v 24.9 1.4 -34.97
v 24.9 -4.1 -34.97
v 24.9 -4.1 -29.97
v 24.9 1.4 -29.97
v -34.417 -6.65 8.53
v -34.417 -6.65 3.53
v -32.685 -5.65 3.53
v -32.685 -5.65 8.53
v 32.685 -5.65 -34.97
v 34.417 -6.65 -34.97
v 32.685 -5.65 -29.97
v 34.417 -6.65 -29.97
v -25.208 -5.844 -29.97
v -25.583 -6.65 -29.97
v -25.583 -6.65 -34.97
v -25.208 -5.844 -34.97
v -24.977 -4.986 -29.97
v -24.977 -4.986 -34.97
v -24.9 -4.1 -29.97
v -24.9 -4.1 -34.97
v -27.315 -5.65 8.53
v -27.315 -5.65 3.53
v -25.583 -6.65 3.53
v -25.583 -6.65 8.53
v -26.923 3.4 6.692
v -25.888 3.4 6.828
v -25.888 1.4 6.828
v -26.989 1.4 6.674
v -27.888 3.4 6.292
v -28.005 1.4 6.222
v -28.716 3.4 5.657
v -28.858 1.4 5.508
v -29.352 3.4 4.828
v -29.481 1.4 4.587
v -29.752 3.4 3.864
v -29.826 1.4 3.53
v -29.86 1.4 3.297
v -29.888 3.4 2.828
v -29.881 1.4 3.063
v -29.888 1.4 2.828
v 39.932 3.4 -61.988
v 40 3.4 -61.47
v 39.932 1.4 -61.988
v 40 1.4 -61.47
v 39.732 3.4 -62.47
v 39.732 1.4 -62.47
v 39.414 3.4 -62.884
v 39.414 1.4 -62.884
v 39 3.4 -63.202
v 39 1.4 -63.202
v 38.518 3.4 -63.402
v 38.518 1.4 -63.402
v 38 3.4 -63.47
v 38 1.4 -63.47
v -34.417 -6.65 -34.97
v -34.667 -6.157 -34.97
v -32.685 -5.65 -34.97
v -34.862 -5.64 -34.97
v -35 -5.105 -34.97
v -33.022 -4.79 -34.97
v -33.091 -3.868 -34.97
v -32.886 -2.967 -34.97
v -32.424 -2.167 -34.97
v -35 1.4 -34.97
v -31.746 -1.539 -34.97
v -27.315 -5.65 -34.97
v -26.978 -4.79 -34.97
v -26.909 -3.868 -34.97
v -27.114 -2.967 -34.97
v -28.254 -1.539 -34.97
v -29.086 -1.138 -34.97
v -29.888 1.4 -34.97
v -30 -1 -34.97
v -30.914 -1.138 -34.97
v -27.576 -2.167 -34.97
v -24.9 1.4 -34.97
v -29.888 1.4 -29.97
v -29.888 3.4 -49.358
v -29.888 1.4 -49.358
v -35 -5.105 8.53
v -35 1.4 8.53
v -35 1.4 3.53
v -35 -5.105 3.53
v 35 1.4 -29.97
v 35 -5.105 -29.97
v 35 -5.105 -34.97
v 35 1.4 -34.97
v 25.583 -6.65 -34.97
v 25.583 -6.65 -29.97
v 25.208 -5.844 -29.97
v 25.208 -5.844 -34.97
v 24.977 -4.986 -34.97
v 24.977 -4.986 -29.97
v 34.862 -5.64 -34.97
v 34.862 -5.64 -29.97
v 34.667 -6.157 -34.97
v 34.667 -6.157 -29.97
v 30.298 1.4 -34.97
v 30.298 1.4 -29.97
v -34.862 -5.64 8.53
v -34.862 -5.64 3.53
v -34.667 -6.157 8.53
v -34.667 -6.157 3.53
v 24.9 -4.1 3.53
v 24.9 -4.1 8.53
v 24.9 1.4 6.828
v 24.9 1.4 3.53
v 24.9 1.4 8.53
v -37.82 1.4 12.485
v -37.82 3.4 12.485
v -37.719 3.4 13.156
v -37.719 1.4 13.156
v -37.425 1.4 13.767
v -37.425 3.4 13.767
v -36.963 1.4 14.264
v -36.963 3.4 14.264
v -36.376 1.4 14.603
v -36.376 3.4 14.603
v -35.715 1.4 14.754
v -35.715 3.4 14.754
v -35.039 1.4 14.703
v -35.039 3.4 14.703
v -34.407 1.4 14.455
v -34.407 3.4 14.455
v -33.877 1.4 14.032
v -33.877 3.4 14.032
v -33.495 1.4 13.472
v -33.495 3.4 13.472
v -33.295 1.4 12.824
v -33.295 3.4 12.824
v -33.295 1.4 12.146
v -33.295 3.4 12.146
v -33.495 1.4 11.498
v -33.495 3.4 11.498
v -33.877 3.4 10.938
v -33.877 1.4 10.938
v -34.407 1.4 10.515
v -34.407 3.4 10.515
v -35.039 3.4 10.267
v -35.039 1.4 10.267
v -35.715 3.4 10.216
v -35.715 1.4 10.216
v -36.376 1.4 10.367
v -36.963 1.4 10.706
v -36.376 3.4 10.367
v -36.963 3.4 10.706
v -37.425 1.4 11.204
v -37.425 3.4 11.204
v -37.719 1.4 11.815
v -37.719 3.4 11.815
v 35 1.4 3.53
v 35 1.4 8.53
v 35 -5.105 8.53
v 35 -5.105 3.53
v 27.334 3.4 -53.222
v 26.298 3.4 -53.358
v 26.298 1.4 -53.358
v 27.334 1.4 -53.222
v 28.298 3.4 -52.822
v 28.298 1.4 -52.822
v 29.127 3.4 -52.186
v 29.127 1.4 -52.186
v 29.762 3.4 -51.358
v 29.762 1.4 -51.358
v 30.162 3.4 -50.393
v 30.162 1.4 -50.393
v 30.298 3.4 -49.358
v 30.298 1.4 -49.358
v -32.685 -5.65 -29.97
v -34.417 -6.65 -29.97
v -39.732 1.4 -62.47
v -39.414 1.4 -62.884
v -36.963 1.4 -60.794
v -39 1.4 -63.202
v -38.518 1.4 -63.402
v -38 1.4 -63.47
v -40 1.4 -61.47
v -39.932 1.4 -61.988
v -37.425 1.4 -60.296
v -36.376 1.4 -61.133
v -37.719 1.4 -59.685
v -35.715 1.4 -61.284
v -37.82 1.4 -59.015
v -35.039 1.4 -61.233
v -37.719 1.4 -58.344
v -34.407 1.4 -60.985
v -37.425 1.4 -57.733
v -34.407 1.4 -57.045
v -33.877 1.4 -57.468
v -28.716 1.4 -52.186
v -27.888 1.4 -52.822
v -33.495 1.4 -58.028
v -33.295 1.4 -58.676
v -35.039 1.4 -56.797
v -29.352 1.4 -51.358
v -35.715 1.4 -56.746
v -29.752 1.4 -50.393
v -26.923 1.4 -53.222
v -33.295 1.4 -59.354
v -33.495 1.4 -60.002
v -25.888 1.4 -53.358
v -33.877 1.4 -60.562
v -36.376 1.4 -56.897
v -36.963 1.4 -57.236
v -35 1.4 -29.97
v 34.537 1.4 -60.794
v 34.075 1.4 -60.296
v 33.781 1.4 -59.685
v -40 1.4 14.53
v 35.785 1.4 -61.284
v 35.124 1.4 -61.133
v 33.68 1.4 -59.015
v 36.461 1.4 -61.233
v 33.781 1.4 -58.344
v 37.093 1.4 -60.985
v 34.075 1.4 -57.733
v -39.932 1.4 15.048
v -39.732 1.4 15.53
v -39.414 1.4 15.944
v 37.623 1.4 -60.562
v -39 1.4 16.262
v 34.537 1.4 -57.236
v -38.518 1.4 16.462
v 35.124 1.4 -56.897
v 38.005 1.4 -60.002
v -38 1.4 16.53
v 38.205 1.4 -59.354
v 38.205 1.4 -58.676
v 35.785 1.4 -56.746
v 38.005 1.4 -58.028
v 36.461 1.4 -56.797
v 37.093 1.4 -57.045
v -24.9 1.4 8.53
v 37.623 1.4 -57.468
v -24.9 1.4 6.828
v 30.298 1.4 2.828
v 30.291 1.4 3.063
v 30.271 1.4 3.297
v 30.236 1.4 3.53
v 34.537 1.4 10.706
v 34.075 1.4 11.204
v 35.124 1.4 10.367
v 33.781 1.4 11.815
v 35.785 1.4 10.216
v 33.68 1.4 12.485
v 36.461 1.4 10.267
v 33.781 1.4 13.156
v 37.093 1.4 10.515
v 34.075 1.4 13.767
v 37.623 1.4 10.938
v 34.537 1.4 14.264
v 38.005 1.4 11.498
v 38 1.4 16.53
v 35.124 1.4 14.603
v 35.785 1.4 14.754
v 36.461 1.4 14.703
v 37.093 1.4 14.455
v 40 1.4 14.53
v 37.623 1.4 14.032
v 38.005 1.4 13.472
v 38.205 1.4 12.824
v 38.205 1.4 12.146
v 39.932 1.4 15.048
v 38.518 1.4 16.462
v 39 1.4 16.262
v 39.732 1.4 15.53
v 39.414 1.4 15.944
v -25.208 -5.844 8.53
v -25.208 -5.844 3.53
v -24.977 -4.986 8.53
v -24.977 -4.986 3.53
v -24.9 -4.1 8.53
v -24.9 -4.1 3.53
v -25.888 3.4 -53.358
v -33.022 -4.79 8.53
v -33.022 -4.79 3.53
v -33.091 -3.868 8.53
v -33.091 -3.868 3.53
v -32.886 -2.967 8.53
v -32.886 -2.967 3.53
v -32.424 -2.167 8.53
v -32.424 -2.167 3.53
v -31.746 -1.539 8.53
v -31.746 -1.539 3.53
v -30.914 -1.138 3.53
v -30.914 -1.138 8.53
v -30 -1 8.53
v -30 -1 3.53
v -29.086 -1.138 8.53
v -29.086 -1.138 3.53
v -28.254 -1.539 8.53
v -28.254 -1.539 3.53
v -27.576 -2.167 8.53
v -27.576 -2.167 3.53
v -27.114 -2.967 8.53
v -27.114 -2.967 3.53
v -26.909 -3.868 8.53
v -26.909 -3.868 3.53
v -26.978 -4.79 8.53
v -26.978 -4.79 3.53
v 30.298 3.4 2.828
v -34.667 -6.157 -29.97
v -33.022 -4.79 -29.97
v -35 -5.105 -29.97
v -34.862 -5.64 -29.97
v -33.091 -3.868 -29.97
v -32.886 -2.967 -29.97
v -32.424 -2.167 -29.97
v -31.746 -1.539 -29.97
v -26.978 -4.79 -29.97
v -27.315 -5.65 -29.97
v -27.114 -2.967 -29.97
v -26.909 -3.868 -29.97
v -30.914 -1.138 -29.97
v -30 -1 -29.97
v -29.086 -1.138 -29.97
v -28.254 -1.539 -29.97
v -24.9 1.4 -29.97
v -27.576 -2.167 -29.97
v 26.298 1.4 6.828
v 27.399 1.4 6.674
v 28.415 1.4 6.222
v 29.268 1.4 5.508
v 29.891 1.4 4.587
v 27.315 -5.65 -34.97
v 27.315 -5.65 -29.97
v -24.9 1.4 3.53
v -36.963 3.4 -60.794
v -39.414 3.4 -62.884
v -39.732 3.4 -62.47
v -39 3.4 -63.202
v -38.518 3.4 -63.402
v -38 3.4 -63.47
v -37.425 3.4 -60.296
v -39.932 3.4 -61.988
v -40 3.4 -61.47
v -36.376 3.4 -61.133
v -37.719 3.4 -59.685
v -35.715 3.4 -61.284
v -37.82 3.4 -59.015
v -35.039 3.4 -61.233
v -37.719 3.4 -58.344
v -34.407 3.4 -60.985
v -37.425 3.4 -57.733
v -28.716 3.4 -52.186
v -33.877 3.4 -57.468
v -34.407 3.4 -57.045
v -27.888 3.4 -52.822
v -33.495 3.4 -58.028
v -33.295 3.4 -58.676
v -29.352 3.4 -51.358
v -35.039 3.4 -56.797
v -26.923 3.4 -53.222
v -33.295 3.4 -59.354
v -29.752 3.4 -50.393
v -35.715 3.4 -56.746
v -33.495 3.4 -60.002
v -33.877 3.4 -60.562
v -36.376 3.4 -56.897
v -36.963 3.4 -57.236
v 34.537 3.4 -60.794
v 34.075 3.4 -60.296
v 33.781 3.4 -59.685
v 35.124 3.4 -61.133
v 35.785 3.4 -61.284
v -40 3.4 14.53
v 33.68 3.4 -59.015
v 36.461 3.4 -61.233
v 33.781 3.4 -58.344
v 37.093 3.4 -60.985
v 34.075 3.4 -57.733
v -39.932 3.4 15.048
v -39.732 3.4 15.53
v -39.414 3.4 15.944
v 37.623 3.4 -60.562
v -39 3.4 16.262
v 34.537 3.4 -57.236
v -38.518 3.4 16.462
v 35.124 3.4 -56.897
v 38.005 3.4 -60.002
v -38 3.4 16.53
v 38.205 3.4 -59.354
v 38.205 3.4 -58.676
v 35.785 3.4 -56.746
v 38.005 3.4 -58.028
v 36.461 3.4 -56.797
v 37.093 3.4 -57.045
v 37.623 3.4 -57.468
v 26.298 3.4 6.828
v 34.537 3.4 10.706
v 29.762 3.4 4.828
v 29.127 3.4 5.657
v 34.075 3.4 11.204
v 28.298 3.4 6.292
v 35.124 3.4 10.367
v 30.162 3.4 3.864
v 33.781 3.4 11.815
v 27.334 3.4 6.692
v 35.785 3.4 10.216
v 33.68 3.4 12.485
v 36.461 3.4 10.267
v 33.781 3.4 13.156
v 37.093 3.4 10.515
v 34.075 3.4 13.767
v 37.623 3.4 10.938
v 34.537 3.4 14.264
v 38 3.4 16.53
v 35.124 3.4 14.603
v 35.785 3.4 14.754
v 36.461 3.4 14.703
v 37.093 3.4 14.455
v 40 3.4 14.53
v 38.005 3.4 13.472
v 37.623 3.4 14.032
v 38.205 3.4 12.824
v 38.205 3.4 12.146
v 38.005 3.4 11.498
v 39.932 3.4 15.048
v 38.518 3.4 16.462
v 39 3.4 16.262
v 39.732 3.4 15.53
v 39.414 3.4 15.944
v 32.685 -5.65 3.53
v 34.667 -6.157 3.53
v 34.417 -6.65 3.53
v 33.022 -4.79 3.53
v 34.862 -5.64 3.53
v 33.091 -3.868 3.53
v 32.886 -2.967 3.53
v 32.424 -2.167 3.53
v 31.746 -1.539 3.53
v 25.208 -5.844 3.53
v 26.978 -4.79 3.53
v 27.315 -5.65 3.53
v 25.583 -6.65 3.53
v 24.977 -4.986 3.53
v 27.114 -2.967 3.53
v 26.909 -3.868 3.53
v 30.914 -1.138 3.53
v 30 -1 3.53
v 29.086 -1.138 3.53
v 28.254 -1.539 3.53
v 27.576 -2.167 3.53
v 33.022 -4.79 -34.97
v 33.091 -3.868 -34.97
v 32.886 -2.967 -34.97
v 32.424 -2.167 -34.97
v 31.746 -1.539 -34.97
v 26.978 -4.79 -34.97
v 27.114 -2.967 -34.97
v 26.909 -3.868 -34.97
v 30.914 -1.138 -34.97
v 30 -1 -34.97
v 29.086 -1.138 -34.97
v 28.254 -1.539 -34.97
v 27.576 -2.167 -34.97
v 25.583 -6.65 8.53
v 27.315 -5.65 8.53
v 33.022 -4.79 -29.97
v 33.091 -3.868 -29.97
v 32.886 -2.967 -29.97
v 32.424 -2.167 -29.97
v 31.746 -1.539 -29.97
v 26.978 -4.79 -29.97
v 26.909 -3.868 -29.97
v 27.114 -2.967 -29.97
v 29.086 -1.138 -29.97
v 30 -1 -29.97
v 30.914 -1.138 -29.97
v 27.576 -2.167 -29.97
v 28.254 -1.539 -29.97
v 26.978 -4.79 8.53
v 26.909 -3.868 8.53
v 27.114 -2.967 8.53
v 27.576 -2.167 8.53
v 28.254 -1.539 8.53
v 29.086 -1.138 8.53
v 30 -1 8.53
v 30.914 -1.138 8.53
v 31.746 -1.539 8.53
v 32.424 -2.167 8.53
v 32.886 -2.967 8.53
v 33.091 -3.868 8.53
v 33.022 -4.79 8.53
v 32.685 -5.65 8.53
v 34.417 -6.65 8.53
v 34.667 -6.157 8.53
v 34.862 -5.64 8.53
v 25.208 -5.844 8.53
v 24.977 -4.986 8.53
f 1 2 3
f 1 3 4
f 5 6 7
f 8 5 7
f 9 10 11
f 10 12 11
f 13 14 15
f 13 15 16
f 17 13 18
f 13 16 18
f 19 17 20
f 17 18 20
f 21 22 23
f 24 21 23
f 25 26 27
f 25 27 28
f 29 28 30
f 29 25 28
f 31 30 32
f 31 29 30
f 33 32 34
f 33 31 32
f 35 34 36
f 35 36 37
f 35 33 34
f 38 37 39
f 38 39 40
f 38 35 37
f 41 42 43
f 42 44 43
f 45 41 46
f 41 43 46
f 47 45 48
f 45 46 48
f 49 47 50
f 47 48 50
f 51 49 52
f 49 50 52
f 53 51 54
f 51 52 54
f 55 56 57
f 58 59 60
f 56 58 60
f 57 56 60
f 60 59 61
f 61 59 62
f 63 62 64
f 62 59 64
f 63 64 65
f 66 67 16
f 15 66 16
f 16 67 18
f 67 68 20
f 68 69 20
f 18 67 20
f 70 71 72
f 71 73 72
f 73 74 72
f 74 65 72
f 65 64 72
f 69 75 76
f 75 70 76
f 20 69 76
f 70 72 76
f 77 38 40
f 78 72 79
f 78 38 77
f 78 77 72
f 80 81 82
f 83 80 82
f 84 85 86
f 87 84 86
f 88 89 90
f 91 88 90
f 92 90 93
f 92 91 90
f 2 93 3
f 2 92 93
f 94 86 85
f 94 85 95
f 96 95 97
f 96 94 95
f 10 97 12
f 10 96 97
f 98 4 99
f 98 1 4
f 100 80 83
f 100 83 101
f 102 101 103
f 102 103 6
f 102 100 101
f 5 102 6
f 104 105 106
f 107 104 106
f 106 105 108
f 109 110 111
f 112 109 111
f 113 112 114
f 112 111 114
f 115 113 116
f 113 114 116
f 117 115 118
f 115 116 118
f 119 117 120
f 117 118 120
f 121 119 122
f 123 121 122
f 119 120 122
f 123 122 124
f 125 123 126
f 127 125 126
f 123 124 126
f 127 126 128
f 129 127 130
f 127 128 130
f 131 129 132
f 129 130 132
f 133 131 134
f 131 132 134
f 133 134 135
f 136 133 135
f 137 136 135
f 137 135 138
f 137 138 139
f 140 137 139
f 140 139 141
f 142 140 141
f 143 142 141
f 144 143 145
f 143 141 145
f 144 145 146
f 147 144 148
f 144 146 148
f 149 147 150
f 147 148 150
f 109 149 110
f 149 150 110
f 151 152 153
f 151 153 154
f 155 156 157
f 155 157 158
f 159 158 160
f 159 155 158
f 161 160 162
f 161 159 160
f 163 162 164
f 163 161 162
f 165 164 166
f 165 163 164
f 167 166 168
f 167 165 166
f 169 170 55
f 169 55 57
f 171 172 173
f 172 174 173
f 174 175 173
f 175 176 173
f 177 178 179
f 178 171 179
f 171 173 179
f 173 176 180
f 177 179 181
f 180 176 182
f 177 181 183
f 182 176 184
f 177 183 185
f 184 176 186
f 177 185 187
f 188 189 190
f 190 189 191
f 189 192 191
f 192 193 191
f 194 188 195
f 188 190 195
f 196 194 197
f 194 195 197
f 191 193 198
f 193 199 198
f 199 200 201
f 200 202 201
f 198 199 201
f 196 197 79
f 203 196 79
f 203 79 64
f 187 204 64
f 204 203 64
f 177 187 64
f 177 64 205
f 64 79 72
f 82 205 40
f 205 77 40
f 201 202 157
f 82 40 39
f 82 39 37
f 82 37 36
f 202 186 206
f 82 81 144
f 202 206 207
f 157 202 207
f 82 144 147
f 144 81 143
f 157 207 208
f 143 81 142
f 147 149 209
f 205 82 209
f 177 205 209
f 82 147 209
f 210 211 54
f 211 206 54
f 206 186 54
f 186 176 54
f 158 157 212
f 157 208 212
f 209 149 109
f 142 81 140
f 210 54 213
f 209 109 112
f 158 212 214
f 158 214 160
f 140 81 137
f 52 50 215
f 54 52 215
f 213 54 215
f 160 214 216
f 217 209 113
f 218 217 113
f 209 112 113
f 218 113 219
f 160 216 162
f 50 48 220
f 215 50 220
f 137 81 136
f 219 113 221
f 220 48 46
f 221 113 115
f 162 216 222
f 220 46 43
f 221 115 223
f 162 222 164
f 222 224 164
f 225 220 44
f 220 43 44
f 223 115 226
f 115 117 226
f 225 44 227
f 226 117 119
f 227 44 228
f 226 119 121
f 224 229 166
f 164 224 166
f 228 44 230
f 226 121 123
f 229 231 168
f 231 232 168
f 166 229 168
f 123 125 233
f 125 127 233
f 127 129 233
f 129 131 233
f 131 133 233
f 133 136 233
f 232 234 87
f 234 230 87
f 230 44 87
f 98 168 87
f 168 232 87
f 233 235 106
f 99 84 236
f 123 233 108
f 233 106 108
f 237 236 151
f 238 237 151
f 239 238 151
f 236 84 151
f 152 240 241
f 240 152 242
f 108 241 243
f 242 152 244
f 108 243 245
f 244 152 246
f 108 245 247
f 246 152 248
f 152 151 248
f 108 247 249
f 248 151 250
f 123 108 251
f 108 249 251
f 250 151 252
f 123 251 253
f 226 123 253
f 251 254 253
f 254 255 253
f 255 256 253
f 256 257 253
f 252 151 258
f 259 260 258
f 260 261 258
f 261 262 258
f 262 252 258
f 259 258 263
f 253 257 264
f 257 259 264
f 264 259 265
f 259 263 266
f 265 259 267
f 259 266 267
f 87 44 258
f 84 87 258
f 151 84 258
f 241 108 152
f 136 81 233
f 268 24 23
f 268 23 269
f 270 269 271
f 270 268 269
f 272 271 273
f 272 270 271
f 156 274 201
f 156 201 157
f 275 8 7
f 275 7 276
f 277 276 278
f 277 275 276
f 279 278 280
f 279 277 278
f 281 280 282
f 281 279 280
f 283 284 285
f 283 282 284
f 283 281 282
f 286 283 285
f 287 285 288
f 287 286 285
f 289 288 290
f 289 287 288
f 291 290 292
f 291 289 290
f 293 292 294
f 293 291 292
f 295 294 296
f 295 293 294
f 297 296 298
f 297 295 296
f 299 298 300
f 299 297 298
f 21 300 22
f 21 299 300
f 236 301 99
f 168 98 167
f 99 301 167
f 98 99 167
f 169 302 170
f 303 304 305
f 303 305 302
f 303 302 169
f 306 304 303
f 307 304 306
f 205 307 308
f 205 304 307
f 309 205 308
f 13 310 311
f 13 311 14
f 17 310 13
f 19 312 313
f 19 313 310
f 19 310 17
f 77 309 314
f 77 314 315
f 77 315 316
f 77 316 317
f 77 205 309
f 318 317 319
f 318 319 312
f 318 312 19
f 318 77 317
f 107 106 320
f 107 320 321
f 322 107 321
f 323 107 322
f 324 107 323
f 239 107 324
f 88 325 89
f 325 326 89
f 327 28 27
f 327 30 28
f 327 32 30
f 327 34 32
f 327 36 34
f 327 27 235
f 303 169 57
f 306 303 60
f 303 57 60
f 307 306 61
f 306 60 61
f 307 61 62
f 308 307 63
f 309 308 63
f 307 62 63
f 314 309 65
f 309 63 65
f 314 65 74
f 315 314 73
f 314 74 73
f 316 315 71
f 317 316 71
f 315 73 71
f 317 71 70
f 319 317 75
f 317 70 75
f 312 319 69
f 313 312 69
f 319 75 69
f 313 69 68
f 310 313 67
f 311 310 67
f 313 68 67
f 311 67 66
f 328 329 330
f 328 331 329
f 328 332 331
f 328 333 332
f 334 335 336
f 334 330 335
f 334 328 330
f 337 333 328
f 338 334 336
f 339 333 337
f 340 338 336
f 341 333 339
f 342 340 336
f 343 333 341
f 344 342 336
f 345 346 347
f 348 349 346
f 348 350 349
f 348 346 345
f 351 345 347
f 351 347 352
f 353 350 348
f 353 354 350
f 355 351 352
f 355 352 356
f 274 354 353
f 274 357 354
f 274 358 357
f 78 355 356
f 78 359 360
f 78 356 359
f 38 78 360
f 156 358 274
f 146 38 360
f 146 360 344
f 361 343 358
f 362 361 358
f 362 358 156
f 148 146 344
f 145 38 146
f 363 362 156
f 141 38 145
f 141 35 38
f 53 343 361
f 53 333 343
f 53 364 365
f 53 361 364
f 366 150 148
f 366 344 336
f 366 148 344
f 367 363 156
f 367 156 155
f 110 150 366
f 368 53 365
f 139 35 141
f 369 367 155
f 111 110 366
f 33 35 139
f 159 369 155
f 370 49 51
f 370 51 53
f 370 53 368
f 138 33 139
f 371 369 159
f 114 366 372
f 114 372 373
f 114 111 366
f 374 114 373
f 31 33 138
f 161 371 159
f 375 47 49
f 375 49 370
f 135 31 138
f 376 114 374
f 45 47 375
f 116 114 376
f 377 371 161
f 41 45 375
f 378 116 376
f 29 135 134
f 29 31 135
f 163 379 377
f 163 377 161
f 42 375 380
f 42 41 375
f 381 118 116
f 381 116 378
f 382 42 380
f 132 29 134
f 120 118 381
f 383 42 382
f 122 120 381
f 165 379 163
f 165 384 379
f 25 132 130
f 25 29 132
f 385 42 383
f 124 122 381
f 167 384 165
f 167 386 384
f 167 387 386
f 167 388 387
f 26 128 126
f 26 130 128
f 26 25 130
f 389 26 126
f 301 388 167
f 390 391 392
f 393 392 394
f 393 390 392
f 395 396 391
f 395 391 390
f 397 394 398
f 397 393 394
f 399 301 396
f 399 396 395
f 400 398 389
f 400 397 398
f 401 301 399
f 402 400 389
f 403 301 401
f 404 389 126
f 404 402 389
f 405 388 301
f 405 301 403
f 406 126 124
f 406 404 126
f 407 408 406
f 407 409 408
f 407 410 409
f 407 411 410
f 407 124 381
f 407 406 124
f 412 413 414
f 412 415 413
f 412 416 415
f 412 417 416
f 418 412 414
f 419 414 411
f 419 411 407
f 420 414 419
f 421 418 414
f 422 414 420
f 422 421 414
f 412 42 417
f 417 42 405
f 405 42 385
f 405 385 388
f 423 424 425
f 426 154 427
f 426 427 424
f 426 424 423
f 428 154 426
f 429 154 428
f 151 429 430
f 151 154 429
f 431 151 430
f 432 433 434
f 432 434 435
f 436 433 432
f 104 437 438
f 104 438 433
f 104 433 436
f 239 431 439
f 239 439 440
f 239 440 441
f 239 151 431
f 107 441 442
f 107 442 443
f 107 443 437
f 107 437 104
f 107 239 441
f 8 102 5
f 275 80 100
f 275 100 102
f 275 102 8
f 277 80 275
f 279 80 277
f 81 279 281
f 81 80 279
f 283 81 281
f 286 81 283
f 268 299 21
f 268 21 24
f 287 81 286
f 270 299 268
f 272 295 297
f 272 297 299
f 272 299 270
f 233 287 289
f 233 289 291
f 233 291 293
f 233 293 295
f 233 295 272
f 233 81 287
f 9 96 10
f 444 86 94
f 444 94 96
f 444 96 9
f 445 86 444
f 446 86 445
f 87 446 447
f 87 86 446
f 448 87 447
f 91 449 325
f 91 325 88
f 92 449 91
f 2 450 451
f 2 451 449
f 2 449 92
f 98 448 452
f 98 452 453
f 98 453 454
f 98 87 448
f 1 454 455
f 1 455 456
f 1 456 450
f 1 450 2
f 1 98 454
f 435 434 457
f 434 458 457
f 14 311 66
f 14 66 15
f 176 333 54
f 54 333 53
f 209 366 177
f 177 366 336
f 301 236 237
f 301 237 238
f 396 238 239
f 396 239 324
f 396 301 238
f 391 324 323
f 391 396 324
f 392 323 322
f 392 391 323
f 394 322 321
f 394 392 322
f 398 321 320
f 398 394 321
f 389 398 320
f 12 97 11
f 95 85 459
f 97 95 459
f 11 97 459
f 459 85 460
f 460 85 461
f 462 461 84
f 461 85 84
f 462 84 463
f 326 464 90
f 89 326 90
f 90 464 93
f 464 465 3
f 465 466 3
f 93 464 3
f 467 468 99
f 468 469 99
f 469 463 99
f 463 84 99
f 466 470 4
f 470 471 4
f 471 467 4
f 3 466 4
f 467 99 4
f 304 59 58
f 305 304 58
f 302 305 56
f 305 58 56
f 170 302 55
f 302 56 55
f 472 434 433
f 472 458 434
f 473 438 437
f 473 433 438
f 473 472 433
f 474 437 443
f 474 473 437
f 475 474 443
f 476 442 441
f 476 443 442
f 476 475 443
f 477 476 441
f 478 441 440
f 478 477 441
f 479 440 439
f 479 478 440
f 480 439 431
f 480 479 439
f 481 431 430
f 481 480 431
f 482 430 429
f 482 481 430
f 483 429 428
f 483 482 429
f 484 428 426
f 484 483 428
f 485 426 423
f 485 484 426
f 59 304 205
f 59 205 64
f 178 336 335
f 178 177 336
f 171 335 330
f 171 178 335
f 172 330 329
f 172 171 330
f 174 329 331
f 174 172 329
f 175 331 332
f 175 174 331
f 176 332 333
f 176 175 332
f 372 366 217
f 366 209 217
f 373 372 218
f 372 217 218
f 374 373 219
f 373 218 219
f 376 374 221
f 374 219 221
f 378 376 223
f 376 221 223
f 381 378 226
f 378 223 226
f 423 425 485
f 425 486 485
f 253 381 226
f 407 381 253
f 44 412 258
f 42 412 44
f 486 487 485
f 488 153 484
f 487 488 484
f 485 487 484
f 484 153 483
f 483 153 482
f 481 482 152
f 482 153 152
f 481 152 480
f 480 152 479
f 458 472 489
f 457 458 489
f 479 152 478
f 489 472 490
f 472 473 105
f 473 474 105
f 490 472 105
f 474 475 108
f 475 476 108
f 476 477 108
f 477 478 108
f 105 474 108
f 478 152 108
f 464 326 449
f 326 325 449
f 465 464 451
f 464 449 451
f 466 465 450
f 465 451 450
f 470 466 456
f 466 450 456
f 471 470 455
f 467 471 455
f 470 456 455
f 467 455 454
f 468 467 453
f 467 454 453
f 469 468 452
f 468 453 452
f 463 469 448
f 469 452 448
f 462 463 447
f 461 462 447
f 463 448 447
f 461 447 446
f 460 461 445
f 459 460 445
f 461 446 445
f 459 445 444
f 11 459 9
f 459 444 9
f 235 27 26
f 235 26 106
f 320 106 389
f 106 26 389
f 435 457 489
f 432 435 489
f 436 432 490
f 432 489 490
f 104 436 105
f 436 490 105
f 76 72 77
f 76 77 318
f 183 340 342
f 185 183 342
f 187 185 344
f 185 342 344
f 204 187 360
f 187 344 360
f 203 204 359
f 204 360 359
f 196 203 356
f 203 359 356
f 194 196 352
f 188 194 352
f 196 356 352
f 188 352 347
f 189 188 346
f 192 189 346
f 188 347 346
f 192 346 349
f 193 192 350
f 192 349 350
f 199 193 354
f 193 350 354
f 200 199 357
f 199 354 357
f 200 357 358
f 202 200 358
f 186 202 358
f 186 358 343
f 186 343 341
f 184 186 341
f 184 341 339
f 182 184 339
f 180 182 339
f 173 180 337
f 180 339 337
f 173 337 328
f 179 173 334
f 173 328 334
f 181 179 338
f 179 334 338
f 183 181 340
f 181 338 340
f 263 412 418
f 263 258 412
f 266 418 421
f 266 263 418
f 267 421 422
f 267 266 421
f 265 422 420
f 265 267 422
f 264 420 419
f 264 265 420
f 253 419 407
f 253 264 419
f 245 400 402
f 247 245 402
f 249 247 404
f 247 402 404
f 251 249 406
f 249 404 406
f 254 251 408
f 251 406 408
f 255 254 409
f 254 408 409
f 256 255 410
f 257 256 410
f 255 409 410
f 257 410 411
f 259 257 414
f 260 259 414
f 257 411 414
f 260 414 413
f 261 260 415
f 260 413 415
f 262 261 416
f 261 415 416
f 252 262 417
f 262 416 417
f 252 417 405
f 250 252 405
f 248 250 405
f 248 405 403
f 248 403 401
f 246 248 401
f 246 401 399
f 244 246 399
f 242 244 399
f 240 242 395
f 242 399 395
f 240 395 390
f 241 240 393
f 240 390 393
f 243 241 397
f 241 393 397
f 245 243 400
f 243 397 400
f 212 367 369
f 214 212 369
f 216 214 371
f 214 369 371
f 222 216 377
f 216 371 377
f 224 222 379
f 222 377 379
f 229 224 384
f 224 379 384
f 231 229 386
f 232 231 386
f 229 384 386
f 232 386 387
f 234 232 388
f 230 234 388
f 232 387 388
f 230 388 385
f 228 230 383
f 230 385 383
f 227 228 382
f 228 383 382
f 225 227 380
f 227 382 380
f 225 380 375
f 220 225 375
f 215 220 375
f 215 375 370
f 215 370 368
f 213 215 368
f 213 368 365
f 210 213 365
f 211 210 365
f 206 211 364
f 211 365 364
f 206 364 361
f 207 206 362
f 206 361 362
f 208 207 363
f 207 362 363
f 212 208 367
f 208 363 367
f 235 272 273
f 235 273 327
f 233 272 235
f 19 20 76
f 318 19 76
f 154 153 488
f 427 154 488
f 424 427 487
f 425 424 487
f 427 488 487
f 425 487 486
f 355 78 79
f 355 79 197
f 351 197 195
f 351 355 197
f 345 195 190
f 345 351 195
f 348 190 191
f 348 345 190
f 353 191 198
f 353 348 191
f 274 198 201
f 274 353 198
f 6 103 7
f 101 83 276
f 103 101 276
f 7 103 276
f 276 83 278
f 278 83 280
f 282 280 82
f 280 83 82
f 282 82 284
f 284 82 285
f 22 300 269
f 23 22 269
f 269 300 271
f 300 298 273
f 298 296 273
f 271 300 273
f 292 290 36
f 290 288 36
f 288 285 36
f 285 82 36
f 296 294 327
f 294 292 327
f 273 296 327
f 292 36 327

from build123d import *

# Parameters (mm, degrees)
SKETCH1_W               = 70
SKETCH1_H               = 57.5
BOSS_EXTRUDE1_DEPTH     = 8
BOSS_EXTRUDE2_START     = -2
SKETCH3_R               = 3.1
BOSS_EXTRUDE2_DEPTH     = 5
CUT_EXTRUDE1_DEPTH      = 10
CUT_EXTRUDE1_DEPTH_BACK = 63
MOVE_FACE1_BY           = 6
SKETCH5_W               = 80
SKETCH5_H               = 80
BOSS_EXTRUDE3_DEPTH     = 2
FILLET1_R               = 2
SKETCH6_R               = 2.275
CUT_EXTRUDE2_DEPTH      = 2
SKETCH7_W               = 60.186291501
SKETCH7_H               = 60.186291501
CUT_EXTRUDE3_DEPTH      = 2
FILLET2_R               = 4


with BuildPart() as part:
    # Sketch1 → Boss-Extrude1 (new body)
    with BuildSketch(Plane(origin=(0, 1.4, 0), x_dir=(1, 0, 0), z_dir=(0, 1, 0))):
        with Locations((0, 12.22)):
            Rectangle(SKETCH1_W, SKETCH1_H)
    extrude(amount=BOSS_EXTRUDE1_DEPTH)

    # Sketch3 → Boss-Extrude2 (add)
    # profile 1 of 2: a face of its own
    with BuildSketch(Plane(origin=(0, 0, -36.97), x_dir=(-1, 0, 0), z_dir=(0, 0, -1)).offset(BOSS_EXTRUDE2_START)):
        with BuildLine():
            ThreePointArc((-35, -5.104987562), (-29.495024753, -9.174938423), (-24.9, -4.1))
            Line((-24.9, -4.1), (-24.9, 1.4))
            Line((-24.9, 1.4), (-35, 1.4))
            Line((-35, 1.4), (-35, -5.104987562))
        make_face()
        with Locations(Location((-30, -4.1, 0), (0, 0, 180))):
            Circle(SKETCH3_R, mode=Mode.SUBTRACT)
    # profile 2 of 2: a face of its own
    with BuildSketch(Plane(origin=(0, 0, -36.97), x_dir=(-1, 0, 0), z_dir=(0, 0, -1)).offset(BOSS_EXTRUDE2_START)):
        with BuildLine():
            Line((35, 1.4), (35, -5.104987562))
            ThreePointArc((35, -5.104987562), (29.495024753, -9.174938423), (24.9, -4.1))
            Line((24.9, -4.1), (24.9, 1.4))
            Line((24.9, 1.4), (35, 1.4))
        make_face()
        with Locations(Location((30, -4.1, 0), (0, 0, 180))):
            Circle(SKETCH3_R, mode=Mode.SUBTRACT)
    boss_extrude2 = extrude(amount=-BOSS_EXTRUDE2_DEPTH)

    # Mirror1: Boss-Extrude2 across plane
    add(boss_extrude2.mirror(Plane.XY.offset(-13.22)))

    # Sketch4 → Cut-Extrude1 (cut, two sides: drawn at the far end of the back side and taken through both)
    with BuildSketch(Plane(origin=(0, 0, -29.97), x_dir=(-1, 0, 0), z_dir=(0, 0, -1)).offset(-CUT_EXTRUDE1_DEPTH_BACK)):
        Polygon((-30, -4.1), (-20, -9.873502692), (-40, -9.873502692), align=None)
        Polygon((20, -9.873502692), (40, -9.873502692), (30, -4.1), align=None)
    extrude(amount=CUT_EXTRUDE1_DEPTH + CUT_EXTRUDE1_DEPTH_BACK, mode=Mode.SUBTRACT)

    # Move Face1: a face moved inward by 6.0
    extrude(part.faces().sort_by_distance((0, 9.4, -12.22))[0], amount=MOVE_FACE1_BY, dir=(0, -1, 0), mode=Mode.SUBTRACT)

    # Sketch5 → Boss-Extrude3 (add)
    with BuildSketch(Plane(origin=(0, 3.4, 0), x_dir=(1, 0, 0), z_dir=(0, 1, 0))):
        with Locations((0, 23.47)):
            Rectangle(SKETCH5_W, SKETCH5_H)
    extrude(amount=-BOSS_EXTRUDE3_DEPTH)

    # Fillet1
    fillet1_edges = [part.edges().sort_by_distance(p)[0] for p in [
        (40, 2.4, 16.53),
        (-40, 2.4, 16.53),
        (-40, 2.4, -63.47),
        (40, 2.4, -63.47),
    ]]
    fillet(fillet1_edges, radius=FILLET1_R)

    # Sketch6 → Cut-Extrude2 (cut)
    with BuildSketch(Plane(origin=(0, 3.4, 0), x_dir=(1, 0, 0), z_dir=(0, 1, 0))):
        with Locations(Location((35.955095469, 59.014904531, 0), (0, 0, 180))):
            Circle(SKETCH6_R)
        with Locations(Location((35.955095469, -12.485095469, 0), (0, 0, 180))):
            Circle(SKETCH6_R)
        with Locations(Location((-35.544904531, 59.014904531, 0), (0, 0, 180))):
            Circle(SKETCH6_R)
        with Locations(Location((-35.544904531, -12.485095469, 0), (0, 0, 180))):
            Circle(SKETCH6_R)
    extrude(amount=-CUT_EXTRUDE2_DEPTH, mode=Mode.SUBTRACT)

    # Sketch7 → Cut-Extrude3 (cut)
    with BuildSketch(Plane(origin=(0, 3.4, 0), x_dir=(1, 0, 0), z_dir=(0, 1, 0))):
        with Locations((0.205095468, 23.264904532)):
            Rectangle(SKETCH7_W, SKETCH7_H)
    extrude(amount=-CUT_EXTRUDE3_DEPTH, mode=Mode.SUBTRACT)

    # Fillet2
    # the kernel refuses this fillet: 4 mm, written as the material it adds along each edge
    with BuildSketch(Plane(origin=(30.298241219, 3.4, -53.358050282), x_dir=(-1, 0, 0), z_dir=(0, -1, 0)), Plane(origin=(30.298241219, 3.4, 6.828241219), x_dir=(0, 0, -1), z_dir=(0, -1, 0)), Plane(origin=(-29.888050282, 3.4, -53.358050282), x_dir=(0, 0, 1), z_dir=(0, -1, 0))) as fillet2_piece_1:
        with BuildLine():
            CenterArc((FILLET2_R, -FILLET2_R), FILLET2_R, 90, 90)
            Line((0, -FILLET2_R), (0, 0))
            Line((0, 0), (FILLET2_R, 0))
        make_face()
    extrude(amount=2)
    with BuildSketch(Plane(origin=(-29.888050282, 3.4, 6.828241219), x_dir=(0, 0, -1), z_dir=(0, -1, 0))) as fillet2_piece_2:
        with BuildLine():
            CenterArc((FILLET2_R, FILLET2_R), FILLET2_R, 180, 90)
            Line((0, FILLET2_R), (0, 0))
            Line((0, 0), (FILLET2_R, 0))
        make_face()
    extrude(amount=2)


solid = part.part
